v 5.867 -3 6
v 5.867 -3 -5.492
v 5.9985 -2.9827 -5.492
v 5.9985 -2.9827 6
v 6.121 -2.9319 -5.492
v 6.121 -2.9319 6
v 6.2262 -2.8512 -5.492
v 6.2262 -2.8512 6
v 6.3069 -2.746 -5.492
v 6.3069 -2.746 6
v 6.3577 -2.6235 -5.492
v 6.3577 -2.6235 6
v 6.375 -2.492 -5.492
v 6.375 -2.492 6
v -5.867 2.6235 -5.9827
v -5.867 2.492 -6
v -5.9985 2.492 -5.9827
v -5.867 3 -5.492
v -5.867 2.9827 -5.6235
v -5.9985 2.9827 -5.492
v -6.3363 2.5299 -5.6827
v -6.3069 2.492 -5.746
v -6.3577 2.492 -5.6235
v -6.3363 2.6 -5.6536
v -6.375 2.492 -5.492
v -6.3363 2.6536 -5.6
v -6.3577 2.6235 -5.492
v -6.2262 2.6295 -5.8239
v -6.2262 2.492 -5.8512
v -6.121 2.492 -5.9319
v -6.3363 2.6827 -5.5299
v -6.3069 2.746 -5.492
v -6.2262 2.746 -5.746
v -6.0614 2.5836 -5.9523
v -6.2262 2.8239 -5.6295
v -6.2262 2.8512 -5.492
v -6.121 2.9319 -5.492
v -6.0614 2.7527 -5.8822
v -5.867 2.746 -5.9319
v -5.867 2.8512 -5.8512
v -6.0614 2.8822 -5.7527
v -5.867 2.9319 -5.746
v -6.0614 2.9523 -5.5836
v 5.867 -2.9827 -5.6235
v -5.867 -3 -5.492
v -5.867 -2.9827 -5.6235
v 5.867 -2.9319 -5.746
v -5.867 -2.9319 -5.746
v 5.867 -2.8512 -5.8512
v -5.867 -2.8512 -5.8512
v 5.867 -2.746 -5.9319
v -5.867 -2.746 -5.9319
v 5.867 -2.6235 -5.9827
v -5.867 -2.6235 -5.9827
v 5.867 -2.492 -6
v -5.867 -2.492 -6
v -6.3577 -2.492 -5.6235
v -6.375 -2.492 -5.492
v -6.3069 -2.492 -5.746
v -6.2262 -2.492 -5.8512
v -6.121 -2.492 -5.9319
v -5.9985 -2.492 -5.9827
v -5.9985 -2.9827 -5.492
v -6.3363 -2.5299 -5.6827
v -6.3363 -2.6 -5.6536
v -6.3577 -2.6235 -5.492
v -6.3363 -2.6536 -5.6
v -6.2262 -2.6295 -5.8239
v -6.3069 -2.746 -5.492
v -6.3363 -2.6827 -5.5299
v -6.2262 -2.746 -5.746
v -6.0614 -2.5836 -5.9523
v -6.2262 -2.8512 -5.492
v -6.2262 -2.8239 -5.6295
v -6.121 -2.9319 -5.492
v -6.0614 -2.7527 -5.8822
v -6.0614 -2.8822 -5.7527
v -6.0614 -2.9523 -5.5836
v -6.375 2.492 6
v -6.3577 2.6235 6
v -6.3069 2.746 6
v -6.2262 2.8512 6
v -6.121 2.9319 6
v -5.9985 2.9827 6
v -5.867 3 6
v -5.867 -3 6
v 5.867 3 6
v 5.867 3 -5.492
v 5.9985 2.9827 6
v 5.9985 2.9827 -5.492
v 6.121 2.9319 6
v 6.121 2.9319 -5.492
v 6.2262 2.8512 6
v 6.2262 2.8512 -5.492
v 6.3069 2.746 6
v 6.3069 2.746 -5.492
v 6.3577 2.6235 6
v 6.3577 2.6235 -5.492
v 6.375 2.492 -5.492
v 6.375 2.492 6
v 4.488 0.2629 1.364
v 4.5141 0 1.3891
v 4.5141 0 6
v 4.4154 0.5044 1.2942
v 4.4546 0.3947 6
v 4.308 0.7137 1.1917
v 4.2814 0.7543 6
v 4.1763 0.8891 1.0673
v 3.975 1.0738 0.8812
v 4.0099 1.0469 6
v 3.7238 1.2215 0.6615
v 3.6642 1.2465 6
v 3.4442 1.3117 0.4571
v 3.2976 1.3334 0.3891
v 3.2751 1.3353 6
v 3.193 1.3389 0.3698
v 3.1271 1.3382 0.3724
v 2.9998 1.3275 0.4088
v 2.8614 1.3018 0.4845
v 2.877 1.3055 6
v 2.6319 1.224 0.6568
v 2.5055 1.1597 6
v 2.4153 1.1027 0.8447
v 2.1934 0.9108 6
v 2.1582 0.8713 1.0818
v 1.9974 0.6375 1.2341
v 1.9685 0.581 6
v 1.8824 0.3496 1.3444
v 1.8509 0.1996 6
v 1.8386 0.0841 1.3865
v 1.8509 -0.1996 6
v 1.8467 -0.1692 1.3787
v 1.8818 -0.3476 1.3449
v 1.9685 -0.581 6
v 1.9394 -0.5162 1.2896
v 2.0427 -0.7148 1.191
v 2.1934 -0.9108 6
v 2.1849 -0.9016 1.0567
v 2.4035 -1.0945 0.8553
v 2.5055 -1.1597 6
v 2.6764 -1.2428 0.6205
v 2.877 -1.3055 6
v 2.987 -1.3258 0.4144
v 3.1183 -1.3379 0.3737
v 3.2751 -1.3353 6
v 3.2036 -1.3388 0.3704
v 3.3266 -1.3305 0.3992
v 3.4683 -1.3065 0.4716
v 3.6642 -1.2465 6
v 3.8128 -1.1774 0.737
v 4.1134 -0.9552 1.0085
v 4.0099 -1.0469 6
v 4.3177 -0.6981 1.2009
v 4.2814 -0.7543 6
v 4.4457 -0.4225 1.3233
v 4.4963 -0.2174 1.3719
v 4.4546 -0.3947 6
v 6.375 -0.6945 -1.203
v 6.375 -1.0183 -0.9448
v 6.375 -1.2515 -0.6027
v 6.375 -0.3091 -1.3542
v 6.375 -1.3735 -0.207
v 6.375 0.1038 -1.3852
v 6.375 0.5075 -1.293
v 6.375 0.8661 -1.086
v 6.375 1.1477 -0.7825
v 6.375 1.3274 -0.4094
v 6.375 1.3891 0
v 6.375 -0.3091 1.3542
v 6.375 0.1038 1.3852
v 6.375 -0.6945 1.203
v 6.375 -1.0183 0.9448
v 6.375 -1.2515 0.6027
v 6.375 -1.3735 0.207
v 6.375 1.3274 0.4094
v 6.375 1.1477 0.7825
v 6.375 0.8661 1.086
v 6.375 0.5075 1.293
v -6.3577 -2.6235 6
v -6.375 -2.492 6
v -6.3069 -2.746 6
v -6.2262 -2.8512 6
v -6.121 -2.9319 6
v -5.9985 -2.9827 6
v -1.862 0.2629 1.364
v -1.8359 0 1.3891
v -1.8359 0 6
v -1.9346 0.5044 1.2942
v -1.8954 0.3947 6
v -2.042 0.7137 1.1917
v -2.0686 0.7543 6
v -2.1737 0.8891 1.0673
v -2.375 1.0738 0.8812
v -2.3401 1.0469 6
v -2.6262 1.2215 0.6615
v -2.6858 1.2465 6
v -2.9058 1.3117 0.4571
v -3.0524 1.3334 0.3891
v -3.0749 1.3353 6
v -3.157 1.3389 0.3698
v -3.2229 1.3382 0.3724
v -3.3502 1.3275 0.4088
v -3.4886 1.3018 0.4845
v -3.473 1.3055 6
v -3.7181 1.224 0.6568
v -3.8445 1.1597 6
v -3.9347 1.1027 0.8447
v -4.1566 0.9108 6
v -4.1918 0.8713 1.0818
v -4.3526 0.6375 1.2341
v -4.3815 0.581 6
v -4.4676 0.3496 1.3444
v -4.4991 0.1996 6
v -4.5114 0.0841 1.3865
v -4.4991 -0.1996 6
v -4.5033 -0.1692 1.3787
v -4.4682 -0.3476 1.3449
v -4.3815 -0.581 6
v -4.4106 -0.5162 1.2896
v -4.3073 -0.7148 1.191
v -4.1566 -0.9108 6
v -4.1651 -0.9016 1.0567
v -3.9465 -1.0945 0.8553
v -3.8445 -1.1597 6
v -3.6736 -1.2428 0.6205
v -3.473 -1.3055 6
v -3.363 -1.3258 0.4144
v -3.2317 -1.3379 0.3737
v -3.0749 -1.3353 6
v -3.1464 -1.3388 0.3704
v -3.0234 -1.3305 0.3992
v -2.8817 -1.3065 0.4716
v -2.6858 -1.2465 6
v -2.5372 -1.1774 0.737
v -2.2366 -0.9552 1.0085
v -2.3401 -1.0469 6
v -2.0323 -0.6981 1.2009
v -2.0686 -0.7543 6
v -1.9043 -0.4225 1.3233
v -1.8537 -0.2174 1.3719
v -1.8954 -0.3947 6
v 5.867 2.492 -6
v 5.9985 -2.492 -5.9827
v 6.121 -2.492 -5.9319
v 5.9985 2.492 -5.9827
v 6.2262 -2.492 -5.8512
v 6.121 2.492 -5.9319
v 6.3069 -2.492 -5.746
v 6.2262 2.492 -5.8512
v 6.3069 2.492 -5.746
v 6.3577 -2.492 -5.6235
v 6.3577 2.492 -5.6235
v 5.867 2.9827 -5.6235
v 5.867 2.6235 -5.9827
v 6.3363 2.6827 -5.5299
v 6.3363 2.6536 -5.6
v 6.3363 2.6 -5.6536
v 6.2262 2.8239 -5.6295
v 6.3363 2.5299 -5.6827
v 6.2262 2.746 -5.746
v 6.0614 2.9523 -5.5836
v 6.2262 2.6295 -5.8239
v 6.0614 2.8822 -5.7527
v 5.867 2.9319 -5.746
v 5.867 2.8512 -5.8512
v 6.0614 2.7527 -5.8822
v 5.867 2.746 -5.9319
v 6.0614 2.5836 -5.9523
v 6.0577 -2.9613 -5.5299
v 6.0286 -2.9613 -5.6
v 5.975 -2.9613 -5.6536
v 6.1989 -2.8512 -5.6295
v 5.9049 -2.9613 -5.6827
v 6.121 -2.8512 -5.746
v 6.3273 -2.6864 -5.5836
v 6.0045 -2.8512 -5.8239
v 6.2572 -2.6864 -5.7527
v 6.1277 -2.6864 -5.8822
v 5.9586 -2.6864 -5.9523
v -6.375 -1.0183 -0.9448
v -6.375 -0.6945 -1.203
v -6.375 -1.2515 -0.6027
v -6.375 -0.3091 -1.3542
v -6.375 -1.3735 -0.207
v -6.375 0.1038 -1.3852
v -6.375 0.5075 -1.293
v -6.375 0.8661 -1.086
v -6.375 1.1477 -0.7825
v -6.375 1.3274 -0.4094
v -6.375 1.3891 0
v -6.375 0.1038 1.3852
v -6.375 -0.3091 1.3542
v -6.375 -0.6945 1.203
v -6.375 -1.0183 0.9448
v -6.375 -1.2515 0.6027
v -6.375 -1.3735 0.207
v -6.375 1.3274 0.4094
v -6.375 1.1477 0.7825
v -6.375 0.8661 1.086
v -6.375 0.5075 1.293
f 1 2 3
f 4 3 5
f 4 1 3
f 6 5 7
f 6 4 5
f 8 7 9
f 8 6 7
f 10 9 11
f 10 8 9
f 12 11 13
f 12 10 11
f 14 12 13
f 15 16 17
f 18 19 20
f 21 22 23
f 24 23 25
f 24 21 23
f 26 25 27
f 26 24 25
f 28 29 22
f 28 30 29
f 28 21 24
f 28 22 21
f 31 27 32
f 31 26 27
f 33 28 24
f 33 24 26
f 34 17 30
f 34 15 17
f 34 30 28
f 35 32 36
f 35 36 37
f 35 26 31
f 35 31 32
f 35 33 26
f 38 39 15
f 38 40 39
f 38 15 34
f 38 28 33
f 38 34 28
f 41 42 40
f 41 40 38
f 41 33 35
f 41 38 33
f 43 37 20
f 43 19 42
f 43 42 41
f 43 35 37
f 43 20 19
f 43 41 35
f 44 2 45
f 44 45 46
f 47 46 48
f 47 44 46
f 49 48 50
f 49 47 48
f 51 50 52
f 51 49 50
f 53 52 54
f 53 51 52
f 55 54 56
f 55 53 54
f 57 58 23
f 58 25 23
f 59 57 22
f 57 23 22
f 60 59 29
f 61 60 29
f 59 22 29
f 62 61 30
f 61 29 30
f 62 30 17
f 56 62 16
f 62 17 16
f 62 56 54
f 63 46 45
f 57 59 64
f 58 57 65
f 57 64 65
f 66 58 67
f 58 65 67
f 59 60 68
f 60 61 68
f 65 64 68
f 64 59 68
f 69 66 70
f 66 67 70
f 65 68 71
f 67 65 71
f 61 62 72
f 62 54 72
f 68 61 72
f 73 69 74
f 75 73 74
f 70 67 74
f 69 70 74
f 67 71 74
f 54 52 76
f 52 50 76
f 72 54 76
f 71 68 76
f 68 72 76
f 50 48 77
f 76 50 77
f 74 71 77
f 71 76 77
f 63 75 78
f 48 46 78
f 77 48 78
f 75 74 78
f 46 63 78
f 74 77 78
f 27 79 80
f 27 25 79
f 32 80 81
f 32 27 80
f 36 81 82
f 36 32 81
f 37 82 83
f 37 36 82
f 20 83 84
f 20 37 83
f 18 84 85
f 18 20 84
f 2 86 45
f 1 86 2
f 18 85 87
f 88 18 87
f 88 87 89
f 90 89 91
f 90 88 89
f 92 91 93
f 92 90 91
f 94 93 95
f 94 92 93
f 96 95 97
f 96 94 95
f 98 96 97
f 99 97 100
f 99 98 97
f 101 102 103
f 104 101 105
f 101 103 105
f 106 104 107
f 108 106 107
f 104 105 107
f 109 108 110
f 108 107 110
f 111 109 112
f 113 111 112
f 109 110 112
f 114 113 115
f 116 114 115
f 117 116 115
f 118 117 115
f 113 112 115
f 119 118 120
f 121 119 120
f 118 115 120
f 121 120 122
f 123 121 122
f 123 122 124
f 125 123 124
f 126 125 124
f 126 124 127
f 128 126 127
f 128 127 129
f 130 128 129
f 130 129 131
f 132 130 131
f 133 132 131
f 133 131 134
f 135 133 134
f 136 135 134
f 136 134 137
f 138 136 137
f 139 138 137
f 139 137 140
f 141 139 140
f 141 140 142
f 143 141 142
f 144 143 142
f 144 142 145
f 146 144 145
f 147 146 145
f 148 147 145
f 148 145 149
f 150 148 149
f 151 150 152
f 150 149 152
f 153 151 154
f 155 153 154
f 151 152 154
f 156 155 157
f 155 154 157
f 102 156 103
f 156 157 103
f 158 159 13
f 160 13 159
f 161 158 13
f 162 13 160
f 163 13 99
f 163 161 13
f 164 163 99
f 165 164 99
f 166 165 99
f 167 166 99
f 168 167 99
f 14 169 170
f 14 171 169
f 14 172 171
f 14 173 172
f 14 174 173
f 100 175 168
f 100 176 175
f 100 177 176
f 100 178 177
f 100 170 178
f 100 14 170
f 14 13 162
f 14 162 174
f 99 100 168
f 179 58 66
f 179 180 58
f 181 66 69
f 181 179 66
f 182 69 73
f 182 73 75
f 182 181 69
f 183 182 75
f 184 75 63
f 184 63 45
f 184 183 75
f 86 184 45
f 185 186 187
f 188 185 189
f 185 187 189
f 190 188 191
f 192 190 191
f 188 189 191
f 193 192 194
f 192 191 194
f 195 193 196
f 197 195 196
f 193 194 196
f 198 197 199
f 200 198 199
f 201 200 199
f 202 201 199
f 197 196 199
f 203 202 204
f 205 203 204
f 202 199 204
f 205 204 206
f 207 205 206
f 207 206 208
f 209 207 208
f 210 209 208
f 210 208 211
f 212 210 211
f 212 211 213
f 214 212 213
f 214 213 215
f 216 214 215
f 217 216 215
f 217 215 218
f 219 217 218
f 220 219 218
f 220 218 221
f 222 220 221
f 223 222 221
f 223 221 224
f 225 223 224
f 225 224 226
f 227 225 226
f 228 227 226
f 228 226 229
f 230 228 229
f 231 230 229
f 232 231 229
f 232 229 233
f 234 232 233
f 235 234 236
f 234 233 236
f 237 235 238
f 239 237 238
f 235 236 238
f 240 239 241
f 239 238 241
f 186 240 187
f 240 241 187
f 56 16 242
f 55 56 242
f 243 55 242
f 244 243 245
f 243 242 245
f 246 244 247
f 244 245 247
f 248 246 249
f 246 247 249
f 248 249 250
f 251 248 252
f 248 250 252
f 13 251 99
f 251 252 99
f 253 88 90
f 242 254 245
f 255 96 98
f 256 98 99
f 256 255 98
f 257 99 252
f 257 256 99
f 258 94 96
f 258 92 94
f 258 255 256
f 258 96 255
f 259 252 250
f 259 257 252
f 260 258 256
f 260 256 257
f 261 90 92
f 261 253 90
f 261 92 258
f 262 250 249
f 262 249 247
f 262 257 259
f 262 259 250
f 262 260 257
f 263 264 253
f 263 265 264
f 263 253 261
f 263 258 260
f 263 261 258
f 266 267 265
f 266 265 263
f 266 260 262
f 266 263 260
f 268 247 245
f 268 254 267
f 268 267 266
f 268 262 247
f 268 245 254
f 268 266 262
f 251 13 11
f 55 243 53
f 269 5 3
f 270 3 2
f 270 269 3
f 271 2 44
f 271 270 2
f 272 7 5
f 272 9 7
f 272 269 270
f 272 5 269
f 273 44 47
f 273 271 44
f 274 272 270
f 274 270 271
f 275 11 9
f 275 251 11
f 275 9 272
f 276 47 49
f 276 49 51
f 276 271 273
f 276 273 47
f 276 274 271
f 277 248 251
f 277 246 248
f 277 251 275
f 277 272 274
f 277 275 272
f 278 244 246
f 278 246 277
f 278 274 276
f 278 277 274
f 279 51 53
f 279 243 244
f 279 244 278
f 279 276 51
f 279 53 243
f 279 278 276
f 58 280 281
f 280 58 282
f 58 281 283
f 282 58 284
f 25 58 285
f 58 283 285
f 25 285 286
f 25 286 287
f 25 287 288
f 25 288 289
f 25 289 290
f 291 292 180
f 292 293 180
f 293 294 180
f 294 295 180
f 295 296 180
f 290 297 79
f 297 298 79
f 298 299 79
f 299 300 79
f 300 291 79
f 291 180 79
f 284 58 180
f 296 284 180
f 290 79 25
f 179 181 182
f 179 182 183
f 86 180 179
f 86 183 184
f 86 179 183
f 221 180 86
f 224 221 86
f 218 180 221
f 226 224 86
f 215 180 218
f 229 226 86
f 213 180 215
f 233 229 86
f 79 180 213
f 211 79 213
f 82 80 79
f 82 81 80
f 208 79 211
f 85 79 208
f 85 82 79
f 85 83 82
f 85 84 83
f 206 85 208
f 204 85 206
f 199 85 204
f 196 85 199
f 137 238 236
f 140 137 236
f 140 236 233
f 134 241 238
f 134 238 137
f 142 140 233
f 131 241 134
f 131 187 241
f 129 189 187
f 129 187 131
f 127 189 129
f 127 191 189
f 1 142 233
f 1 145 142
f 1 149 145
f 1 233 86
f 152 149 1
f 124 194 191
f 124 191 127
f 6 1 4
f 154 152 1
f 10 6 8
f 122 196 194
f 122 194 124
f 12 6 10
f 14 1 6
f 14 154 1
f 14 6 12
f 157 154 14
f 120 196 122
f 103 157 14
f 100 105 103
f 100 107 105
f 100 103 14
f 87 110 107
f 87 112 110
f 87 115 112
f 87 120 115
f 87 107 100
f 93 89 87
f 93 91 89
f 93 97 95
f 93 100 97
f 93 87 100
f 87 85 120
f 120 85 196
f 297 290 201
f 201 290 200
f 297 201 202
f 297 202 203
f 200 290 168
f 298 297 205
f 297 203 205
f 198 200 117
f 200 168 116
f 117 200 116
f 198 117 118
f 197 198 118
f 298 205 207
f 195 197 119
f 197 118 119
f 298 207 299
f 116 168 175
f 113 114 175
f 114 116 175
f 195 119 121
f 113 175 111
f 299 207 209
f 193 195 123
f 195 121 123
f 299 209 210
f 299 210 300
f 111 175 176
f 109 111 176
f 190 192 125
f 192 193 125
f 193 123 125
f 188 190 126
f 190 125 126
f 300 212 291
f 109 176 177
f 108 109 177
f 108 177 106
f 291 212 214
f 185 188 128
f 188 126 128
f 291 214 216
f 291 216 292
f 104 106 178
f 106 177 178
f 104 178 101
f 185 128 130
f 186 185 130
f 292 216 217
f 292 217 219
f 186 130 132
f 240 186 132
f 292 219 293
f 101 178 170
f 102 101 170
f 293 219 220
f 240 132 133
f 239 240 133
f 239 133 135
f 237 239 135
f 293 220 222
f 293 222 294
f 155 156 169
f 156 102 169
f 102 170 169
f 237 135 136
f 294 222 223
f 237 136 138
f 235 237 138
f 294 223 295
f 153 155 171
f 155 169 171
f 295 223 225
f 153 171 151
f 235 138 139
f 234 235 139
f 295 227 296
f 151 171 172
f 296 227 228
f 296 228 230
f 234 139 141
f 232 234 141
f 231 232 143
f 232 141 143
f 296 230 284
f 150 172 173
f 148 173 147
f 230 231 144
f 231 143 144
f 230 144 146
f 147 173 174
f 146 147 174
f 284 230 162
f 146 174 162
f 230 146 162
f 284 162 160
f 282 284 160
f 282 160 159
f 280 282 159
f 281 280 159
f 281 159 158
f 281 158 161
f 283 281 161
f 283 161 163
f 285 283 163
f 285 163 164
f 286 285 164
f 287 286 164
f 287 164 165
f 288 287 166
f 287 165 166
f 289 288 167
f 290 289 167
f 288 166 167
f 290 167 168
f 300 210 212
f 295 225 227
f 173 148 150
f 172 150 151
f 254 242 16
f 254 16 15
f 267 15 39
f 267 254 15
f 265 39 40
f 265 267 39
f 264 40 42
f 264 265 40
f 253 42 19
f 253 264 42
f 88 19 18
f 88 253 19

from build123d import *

# Parameters (mm, degrees)
F0_W     = 12.75
F0_H     = 6
F1_DEPTH = 6
F2_R     = 1.389063
F3_DEPTH = 12.751
F4_R     = 1.339063
F5_DEPTH = 6.35
F6_R     = 0.508


with BuildPart() as f1:
    # F0 (on Top) → F1 (new body, symmetric)
    with BuildSketch(Plane.XY):
        Rectangle(F0_W, F0_H)
    extrude(amount=F1_DEPTH, both=True)

    # F2 (on face) → F3 (cut, through all)
    with BuildSketch(Plane.YZ.offset(6.375)):
        Circle(F2_R)
    extrude(amount=-F3_DEPTH, mode=Mode.SUBTRACT)

    # F4 (on face) → F5 (cut)
    with BuildSketch(Plane.XY.offset(6)):
        with Locations((-3.175, 0)):
            Circle(F4_R)
        with Locations((3.175, 0)):
            Circle(F4_R)
    extrude(amount=-F5_DEPTH, mode=Mode.SUBTRACT)

    # F6
    f6_edges = [f1.edges().sort_by_distance(p)[0] for p in [
        (0, 3, -6),
        (6.375, 3, 0),
        (6.375, 0, -6),
        (6.375, -3, 0),
        (0, -3, -6),
        (-6.375, 0, -6),
        (-6.375, 3, 0),
        (-6.375, -3, 0),
    ]]
    fillet(f6_edges, radius=F6_R)


solid = f1.part
